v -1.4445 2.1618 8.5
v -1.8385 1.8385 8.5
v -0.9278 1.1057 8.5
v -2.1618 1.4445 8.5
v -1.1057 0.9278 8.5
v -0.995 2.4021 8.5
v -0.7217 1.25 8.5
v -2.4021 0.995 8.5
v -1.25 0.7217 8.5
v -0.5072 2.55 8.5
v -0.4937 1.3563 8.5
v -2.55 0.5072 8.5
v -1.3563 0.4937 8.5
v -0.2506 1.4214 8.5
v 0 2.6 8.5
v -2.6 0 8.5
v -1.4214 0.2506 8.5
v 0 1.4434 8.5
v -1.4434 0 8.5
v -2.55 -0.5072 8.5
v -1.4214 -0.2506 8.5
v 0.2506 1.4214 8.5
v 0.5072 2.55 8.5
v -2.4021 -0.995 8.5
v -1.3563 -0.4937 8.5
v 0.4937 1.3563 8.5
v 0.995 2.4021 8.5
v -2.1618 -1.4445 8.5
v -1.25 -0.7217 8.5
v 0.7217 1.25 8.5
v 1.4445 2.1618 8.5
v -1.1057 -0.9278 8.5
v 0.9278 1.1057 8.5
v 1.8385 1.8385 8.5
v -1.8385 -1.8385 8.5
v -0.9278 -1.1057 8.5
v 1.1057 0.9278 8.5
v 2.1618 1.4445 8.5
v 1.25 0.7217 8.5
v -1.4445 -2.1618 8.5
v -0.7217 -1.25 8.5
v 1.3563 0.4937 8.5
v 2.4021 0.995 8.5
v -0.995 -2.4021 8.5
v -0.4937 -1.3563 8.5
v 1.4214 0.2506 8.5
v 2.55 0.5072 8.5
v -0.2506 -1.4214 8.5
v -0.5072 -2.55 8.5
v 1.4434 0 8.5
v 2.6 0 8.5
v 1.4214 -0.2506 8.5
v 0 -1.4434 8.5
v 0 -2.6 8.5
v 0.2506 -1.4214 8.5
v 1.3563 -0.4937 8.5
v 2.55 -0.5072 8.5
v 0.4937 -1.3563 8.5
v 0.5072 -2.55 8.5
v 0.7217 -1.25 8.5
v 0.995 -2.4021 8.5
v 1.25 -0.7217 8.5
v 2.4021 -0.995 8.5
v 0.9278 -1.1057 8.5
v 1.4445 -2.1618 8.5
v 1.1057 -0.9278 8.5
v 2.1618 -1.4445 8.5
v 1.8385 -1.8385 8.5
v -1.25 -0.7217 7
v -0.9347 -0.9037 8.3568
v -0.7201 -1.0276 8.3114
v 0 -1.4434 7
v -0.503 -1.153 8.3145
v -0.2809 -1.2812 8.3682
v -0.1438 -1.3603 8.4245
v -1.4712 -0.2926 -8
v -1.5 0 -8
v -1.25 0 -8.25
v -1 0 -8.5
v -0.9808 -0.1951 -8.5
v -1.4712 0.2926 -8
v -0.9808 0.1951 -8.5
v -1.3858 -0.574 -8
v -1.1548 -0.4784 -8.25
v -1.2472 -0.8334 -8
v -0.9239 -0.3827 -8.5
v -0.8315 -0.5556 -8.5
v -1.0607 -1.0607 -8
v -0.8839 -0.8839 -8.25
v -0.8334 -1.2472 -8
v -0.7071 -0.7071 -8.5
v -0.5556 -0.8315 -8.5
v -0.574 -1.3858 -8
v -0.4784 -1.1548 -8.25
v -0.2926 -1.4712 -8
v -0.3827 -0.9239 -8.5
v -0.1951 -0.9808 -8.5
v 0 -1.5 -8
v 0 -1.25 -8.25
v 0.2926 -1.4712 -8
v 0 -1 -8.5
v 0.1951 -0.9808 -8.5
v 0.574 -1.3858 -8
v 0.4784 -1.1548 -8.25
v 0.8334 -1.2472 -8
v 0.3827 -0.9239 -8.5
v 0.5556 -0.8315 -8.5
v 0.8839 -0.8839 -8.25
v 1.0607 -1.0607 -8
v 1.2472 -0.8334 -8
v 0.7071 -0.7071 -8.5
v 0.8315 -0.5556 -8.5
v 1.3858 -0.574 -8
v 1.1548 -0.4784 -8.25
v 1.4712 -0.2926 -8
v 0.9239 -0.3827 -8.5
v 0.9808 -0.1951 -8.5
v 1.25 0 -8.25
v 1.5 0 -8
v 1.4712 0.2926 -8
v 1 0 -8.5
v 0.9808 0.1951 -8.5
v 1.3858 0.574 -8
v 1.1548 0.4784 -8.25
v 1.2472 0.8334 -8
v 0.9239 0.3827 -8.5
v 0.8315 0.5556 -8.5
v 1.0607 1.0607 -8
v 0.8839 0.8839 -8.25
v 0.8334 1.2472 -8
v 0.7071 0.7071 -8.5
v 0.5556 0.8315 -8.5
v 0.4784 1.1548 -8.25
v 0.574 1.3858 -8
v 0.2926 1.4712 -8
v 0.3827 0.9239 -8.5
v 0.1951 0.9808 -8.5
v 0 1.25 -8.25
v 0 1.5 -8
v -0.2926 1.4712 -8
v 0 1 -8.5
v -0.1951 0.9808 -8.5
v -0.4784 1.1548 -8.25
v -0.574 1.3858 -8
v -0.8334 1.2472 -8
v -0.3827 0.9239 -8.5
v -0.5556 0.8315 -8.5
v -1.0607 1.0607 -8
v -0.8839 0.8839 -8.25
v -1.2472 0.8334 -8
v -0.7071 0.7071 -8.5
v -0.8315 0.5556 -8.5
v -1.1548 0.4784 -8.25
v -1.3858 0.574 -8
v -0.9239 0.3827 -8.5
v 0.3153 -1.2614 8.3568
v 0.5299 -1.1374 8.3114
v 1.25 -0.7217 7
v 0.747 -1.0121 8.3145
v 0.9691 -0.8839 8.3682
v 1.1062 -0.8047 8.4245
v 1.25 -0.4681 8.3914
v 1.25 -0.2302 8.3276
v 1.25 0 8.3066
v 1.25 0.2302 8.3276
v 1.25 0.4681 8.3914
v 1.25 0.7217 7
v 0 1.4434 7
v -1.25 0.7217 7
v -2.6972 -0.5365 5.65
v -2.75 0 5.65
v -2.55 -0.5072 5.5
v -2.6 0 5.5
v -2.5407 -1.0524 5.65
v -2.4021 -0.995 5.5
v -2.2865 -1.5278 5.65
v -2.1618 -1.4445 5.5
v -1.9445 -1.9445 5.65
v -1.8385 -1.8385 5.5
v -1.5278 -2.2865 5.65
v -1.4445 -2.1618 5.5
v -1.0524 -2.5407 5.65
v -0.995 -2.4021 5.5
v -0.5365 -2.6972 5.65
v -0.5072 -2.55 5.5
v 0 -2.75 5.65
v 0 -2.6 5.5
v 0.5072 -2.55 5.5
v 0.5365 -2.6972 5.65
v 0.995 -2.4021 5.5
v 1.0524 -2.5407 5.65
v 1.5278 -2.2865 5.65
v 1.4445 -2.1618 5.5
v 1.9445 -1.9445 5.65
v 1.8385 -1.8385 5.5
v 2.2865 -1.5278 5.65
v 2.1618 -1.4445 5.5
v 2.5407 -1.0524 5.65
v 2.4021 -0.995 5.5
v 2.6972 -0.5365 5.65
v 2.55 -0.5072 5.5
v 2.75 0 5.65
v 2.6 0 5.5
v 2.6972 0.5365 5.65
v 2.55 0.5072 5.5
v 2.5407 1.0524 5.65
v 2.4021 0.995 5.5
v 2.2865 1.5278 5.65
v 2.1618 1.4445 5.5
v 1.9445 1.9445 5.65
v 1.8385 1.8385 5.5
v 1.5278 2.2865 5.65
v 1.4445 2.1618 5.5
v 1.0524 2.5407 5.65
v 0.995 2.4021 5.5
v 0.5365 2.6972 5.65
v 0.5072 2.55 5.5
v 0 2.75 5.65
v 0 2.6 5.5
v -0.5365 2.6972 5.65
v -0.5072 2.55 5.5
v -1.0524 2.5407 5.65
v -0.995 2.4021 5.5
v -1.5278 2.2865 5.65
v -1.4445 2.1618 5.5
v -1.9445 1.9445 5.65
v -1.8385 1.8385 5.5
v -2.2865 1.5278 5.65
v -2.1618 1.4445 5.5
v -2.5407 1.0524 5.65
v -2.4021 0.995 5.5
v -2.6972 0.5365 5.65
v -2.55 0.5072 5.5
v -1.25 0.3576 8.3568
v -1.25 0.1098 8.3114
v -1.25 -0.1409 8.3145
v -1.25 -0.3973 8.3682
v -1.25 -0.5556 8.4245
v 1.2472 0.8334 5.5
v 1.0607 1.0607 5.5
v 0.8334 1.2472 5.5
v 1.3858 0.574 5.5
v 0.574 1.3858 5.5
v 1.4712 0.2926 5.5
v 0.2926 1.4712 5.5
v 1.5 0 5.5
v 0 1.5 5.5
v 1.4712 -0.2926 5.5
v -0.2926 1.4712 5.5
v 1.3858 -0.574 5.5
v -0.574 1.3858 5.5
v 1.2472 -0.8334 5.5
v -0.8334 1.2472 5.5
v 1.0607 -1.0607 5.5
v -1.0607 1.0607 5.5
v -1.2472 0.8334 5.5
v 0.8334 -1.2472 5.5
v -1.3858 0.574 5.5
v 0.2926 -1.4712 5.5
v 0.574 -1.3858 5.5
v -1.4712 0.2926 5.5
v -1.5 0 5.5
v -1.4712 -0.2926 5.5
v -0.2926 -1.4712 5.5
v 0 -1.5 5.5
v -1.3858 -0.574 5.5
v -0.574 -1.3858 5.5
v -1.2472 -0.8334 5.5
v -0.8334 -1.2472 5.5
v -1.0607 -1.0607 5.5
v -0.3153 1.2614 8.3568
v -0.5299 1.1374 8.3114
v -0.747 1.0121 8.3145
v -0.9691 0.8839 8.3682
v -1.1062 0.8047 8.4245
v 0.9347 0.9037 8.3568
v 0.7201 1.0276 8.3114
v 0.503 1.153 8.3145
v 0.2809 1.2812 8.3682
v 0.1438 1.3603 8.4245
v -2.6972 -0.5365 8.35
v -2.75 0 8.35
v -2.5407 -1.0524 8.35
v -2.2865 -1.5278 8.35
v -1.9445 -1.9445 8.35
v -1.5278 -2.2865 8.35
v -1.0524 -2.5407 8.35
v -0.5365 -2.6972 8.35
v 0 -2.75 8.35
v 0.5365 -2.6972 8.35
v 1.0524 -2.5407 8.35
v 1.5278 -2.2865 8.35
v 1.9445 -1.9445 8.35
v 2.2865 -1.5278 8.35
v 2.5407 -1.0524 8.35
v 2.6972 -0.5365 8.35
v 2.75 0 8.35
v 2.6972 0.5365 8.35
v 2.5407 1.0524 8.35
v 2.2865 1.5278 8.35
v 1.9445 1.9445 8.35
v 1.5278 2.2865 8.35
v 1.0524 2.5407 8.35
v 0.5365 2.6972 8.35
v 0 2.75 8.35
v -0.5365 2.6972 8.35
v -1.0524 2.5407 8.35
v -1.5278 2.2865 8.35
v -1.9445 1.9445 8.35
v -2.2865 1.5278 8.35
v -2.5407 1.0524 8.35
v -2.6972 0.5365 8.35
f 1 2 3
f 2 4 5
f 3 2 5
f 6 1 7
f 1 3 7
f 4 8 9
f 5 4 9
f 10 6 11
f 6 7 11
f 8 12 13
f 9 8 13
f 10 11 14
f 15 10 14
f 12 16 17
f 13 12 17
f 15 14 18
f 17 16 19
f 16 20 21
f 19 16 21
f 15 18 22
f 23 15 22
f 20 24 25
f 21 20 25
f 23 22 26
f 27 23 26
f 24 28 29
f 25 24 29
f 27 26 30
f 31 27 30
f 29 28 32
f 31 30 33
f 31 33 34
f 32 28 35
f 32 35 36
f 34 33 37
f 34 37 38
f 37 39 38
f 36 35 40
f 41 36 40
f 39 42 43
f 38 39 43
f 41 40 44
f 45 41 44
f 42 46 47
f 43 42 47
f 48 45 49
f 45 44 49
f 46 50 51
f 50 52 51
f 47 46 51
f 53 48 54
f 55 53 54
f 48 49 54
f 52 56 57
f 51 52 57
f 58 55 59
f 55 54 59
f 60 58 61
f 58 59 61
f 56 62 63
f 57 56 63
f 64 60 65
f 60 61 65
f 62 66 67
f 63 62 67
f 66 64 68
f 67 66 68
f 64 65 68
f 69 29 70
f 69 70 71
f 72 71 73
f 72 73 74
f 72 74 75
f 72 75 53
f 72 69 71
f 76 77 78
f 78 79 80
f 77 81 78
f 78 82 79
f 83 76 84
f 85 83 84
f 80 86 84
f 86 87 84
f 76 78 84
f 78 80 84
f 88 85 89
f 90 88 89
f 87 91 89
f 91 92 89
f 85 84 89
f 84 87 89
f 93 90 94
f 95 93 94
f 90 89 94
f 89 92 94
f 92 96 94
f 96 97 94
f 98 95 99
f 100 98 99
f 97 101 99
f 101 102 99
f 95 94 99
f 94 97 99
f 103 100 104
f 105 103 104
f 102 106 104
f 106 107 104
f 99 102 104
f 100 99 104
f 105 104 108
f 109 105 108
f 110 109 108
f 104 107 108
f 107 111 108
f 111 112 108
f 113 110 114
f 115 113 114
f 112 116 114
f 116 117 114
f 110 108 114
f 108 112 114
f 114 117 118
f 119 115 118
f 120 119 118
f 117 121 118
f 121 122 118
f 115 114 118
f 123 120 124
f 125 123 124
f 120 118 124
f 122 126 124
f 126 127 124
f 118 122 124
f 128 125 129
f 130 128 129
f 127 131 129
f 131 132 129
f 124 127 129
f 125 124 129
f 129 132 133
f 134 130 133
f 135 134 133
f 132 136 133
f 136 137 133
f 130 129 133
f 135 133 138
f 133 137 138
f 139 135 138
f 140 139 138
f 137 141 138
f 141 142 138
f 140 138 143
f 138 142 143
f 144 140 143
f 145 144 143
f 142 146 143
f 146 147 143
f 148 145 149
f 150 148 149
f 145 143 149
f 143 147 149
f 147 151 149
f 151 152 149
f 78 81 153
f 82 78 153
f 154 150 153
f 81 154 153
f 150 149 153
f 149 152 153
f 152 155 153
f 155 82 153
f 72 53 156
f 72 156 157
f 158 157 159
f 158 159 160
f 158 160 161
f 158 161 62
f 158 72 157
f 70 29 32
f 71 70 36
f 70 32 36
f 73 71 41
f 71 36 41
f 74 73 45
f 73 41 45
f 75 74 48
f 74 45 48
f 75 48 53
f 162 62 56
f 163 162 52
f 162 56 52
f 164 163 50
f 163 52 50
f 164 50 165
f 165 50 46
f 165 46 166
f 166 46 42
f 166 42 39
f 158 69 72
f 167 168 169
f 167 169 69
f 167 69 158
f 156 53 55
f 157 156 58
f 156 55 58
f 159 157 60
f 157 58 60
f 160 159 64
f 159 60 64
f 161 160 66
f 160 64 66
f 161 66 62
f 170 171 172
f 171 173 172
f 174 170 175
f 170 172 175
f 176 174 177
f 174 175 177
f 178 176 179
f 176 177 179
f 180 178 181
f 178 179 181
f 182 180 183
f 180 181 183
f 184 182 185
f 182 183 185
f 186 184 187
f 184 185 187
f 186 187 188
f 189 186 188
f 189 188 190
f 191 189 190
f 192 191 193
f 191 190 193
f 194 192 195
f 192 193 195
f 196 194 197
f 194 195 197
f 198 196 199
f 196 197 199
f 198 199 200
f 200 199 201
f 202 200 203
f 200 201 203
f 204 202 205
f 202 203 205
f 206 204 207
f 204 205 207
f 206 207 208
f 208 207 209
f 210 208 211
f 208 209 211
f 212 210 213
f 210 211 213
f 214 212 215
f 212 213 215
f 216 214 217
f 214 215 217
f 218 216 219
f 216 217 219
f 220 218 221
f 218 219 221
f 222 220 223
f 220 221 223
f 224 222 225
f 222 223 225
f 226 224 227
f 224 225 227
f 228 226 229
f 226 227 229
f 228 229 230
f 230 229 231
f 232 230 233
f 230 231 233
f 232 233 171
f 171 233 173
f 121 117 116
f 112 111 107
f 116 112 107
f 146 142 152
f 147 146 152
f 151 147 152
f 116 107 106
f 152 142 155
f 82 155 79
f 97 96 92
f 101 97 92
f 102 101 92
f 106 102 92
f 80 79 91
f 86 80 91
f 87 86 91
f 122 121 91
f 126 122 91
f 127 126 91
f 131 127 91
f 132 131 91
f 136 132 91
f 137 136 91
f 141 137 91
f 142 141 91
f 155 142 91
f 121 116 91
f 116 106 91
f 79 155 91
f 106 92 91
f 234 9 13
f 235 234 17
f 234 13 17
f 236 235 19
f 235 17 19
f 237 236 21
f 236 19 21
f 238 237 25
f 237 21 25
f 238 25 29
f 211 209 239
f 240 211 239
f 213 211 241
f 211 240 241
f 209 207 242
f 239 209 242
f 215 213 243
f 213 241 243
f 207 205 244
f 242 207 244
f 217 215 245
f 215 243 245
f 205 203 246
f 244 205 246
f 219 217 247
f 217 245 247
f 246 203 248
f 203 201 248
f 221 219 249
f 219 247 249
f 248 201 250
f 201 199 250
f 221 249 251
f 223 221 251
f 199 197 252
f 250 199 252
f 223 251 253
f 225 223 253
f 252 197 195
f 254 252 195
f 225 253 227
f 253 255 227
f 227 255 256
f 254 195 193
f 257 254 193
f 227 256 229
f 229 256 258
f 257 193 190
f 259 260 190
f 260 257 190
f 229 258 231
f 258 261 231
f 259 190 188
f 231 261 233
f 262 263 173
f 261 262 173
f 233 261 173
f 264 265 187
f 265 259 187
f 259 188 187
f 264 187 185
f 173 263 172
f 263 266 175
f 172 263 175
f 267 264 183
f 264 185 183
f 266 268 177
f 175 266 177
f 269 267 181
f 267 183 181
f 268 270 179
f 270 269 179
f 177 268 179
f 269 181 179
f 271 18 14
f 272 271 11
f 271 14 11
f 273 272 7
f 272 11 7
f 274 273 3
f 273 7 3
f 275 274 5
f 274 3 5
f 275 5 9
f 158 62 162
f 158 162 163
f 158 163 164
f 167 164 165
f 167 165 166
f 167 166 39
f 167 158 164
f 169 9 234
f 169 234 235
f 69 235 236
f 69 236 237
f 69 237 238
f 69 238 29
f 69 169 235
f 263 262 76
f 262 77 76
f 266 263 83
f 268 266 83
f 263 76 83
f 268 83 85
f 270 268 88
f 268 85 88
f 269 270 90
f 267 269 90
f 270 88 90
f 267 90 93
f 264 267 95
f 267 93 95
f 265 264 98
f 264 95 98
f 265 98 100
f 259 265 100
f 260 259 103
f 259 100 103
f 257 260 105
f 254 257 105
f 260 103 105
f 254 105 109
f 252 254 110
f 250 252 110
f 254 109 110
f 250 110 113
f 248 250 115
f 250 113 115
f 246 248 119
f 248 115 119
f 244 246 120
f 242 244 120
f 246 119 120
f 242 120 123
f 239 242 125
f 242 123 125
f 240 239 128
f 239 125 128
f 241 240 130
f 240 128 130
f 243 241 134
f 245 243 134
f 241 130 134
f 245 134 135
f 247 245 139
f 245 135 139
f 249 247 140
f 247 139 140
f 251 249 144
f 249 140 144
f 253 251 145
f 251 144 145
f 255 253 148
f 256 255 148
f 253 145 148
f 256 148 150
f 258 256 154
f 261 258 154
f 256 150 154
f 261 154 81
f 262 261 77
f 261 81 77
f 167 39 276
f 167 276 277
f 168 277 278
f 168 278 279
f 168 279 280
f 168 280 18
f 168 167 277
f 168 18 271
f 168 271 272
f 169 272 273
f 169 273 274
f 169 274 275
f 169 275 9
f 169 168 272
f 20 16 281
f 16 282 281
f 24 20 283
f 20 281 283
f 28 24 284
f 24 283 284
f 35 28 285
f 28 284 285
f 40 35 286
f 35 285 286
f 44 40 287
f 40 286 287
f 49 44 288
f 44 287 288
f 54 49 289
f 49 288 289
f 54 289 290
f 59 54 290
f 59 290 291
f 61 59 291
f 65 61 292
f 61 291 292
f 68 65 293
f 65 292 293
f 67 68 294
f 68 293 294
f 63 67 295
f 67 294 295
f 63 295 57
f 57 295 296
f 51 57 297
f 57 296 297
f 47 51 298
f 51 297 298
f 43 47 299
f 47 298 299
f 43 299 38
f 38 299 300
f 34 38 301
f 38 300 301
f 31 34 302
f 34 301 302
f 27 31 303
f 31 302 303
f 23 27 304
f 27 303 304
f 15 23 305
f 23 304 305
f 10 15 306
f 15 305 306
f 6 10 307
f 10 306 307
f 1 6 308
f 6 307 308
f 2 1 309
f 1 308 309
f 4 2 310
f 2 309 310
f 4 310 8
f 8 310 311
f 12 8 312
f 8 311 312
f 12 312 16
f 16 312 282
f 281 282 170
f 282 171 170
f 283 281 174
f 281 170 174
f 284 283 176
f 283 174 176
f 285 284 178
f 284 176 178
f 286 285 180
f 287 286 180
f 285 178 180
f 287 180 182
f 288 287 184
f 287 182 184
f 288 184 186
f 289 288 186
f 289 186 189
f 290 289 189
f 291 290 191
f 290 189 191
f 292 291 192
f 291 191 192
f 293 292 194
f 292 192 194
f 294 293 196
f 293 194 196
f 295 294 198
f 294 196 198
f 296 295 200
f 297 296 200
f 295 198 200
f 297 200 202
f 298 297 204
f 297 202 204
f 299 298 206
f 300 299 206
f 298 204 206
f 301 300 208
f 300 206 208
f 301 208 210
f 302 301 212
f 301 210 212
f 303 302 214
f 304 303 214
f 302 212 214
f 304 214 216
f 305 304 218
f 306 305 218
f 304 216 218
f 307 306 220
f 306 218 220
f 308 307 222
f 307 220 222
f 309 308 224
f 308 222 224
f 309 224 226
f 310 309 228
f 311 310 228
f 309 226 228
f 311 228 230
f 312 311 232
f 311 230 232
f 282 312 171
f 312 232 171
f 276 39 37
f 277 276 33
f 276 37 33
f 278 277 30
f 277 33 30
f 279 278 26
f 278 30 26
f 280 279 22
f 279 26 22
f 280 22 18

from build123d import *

# Parameters (mm, degrees)
CUT_EXTRUDE1_START = -1.5
CUT_EXTRUDE1_DEPTH = 1.5
SKETCH4_R          = 1.443375673
CUT_EXTRUDE2_DEPTH = 0.5
CUT_EXTRUDE2_DRAFT = -45


with BuildPart() as part:
    # Sketch2 → Revolve1 (revolve)
    with BuildSketch(Plane(origin=(0, 0, 0), x_dir=(0, 0, -1), z_dir=(1, 0, 0)), mode=Mode.PRIVATE) as revolve1_sk:
        Polygon((-8.35, 2.75), (-5.65, 2.75), (-5.5, 2.6), (-5.5, 1.5), (8, 1.5), (8.5, 1), (8.5, 0), (-8.5, 0), (-8.5, 2.6), align=None)
    revolve(revolve1_sk.sketch.rotate(Axis((0, 0, -8.5), (0, 0, 1)), 90), axis=Axis((0, 0, -8.5), (0, 0, 1)))

    # Sketch3 → Cut-Extrude1 (cut)
    with BuildSketch(Plane.XY.offset(8.5).offset(CUT_EXTRUDE1_START)):
        Polygon((0, 1.443375673), (-1.25, 0.721687836), (-1.25, -0.721687836), (0, -1.443375673), (1.25, -0.721687836), (1.25, 0.721687836), align=None)
    extrude(amount=CUT_EXTRUDE1_DEPTH, mode=Mode.SUBTRACT)


with BuildPart() as cut_extrude2_tool:
    # Sketch4 → Cut-Extrude2 (with draft: the straight prism first)
    with BuildSketch(Plane.XY.offset(8.5)):
        Circle(SKETCH4_R)
    extrude(amount=-CUT_EXTRUDE2_DEPTH)
    # Cut-Extrude2: the draft: its side faces are tilted about the plane it starts from
    cut_extrude2_sides = [cut_extrude2_tool.faces().sort_by_distance(p)[0] for p in [
        (-1.443375673, 0, 8.25),
    ]]
    draft(cut_extrude2_sides, Plane.XY.offset(8.5), CUT_EXTRUDE2_DRAFT)


with BuildPart() as part_1:
    add(part.part)

    # Cut-Extrude2: cut by cut_extrude2_tool
    add(cut_extrude2_tool.part, mode=Mode.SUBTRACT)


solid = part_1.part
